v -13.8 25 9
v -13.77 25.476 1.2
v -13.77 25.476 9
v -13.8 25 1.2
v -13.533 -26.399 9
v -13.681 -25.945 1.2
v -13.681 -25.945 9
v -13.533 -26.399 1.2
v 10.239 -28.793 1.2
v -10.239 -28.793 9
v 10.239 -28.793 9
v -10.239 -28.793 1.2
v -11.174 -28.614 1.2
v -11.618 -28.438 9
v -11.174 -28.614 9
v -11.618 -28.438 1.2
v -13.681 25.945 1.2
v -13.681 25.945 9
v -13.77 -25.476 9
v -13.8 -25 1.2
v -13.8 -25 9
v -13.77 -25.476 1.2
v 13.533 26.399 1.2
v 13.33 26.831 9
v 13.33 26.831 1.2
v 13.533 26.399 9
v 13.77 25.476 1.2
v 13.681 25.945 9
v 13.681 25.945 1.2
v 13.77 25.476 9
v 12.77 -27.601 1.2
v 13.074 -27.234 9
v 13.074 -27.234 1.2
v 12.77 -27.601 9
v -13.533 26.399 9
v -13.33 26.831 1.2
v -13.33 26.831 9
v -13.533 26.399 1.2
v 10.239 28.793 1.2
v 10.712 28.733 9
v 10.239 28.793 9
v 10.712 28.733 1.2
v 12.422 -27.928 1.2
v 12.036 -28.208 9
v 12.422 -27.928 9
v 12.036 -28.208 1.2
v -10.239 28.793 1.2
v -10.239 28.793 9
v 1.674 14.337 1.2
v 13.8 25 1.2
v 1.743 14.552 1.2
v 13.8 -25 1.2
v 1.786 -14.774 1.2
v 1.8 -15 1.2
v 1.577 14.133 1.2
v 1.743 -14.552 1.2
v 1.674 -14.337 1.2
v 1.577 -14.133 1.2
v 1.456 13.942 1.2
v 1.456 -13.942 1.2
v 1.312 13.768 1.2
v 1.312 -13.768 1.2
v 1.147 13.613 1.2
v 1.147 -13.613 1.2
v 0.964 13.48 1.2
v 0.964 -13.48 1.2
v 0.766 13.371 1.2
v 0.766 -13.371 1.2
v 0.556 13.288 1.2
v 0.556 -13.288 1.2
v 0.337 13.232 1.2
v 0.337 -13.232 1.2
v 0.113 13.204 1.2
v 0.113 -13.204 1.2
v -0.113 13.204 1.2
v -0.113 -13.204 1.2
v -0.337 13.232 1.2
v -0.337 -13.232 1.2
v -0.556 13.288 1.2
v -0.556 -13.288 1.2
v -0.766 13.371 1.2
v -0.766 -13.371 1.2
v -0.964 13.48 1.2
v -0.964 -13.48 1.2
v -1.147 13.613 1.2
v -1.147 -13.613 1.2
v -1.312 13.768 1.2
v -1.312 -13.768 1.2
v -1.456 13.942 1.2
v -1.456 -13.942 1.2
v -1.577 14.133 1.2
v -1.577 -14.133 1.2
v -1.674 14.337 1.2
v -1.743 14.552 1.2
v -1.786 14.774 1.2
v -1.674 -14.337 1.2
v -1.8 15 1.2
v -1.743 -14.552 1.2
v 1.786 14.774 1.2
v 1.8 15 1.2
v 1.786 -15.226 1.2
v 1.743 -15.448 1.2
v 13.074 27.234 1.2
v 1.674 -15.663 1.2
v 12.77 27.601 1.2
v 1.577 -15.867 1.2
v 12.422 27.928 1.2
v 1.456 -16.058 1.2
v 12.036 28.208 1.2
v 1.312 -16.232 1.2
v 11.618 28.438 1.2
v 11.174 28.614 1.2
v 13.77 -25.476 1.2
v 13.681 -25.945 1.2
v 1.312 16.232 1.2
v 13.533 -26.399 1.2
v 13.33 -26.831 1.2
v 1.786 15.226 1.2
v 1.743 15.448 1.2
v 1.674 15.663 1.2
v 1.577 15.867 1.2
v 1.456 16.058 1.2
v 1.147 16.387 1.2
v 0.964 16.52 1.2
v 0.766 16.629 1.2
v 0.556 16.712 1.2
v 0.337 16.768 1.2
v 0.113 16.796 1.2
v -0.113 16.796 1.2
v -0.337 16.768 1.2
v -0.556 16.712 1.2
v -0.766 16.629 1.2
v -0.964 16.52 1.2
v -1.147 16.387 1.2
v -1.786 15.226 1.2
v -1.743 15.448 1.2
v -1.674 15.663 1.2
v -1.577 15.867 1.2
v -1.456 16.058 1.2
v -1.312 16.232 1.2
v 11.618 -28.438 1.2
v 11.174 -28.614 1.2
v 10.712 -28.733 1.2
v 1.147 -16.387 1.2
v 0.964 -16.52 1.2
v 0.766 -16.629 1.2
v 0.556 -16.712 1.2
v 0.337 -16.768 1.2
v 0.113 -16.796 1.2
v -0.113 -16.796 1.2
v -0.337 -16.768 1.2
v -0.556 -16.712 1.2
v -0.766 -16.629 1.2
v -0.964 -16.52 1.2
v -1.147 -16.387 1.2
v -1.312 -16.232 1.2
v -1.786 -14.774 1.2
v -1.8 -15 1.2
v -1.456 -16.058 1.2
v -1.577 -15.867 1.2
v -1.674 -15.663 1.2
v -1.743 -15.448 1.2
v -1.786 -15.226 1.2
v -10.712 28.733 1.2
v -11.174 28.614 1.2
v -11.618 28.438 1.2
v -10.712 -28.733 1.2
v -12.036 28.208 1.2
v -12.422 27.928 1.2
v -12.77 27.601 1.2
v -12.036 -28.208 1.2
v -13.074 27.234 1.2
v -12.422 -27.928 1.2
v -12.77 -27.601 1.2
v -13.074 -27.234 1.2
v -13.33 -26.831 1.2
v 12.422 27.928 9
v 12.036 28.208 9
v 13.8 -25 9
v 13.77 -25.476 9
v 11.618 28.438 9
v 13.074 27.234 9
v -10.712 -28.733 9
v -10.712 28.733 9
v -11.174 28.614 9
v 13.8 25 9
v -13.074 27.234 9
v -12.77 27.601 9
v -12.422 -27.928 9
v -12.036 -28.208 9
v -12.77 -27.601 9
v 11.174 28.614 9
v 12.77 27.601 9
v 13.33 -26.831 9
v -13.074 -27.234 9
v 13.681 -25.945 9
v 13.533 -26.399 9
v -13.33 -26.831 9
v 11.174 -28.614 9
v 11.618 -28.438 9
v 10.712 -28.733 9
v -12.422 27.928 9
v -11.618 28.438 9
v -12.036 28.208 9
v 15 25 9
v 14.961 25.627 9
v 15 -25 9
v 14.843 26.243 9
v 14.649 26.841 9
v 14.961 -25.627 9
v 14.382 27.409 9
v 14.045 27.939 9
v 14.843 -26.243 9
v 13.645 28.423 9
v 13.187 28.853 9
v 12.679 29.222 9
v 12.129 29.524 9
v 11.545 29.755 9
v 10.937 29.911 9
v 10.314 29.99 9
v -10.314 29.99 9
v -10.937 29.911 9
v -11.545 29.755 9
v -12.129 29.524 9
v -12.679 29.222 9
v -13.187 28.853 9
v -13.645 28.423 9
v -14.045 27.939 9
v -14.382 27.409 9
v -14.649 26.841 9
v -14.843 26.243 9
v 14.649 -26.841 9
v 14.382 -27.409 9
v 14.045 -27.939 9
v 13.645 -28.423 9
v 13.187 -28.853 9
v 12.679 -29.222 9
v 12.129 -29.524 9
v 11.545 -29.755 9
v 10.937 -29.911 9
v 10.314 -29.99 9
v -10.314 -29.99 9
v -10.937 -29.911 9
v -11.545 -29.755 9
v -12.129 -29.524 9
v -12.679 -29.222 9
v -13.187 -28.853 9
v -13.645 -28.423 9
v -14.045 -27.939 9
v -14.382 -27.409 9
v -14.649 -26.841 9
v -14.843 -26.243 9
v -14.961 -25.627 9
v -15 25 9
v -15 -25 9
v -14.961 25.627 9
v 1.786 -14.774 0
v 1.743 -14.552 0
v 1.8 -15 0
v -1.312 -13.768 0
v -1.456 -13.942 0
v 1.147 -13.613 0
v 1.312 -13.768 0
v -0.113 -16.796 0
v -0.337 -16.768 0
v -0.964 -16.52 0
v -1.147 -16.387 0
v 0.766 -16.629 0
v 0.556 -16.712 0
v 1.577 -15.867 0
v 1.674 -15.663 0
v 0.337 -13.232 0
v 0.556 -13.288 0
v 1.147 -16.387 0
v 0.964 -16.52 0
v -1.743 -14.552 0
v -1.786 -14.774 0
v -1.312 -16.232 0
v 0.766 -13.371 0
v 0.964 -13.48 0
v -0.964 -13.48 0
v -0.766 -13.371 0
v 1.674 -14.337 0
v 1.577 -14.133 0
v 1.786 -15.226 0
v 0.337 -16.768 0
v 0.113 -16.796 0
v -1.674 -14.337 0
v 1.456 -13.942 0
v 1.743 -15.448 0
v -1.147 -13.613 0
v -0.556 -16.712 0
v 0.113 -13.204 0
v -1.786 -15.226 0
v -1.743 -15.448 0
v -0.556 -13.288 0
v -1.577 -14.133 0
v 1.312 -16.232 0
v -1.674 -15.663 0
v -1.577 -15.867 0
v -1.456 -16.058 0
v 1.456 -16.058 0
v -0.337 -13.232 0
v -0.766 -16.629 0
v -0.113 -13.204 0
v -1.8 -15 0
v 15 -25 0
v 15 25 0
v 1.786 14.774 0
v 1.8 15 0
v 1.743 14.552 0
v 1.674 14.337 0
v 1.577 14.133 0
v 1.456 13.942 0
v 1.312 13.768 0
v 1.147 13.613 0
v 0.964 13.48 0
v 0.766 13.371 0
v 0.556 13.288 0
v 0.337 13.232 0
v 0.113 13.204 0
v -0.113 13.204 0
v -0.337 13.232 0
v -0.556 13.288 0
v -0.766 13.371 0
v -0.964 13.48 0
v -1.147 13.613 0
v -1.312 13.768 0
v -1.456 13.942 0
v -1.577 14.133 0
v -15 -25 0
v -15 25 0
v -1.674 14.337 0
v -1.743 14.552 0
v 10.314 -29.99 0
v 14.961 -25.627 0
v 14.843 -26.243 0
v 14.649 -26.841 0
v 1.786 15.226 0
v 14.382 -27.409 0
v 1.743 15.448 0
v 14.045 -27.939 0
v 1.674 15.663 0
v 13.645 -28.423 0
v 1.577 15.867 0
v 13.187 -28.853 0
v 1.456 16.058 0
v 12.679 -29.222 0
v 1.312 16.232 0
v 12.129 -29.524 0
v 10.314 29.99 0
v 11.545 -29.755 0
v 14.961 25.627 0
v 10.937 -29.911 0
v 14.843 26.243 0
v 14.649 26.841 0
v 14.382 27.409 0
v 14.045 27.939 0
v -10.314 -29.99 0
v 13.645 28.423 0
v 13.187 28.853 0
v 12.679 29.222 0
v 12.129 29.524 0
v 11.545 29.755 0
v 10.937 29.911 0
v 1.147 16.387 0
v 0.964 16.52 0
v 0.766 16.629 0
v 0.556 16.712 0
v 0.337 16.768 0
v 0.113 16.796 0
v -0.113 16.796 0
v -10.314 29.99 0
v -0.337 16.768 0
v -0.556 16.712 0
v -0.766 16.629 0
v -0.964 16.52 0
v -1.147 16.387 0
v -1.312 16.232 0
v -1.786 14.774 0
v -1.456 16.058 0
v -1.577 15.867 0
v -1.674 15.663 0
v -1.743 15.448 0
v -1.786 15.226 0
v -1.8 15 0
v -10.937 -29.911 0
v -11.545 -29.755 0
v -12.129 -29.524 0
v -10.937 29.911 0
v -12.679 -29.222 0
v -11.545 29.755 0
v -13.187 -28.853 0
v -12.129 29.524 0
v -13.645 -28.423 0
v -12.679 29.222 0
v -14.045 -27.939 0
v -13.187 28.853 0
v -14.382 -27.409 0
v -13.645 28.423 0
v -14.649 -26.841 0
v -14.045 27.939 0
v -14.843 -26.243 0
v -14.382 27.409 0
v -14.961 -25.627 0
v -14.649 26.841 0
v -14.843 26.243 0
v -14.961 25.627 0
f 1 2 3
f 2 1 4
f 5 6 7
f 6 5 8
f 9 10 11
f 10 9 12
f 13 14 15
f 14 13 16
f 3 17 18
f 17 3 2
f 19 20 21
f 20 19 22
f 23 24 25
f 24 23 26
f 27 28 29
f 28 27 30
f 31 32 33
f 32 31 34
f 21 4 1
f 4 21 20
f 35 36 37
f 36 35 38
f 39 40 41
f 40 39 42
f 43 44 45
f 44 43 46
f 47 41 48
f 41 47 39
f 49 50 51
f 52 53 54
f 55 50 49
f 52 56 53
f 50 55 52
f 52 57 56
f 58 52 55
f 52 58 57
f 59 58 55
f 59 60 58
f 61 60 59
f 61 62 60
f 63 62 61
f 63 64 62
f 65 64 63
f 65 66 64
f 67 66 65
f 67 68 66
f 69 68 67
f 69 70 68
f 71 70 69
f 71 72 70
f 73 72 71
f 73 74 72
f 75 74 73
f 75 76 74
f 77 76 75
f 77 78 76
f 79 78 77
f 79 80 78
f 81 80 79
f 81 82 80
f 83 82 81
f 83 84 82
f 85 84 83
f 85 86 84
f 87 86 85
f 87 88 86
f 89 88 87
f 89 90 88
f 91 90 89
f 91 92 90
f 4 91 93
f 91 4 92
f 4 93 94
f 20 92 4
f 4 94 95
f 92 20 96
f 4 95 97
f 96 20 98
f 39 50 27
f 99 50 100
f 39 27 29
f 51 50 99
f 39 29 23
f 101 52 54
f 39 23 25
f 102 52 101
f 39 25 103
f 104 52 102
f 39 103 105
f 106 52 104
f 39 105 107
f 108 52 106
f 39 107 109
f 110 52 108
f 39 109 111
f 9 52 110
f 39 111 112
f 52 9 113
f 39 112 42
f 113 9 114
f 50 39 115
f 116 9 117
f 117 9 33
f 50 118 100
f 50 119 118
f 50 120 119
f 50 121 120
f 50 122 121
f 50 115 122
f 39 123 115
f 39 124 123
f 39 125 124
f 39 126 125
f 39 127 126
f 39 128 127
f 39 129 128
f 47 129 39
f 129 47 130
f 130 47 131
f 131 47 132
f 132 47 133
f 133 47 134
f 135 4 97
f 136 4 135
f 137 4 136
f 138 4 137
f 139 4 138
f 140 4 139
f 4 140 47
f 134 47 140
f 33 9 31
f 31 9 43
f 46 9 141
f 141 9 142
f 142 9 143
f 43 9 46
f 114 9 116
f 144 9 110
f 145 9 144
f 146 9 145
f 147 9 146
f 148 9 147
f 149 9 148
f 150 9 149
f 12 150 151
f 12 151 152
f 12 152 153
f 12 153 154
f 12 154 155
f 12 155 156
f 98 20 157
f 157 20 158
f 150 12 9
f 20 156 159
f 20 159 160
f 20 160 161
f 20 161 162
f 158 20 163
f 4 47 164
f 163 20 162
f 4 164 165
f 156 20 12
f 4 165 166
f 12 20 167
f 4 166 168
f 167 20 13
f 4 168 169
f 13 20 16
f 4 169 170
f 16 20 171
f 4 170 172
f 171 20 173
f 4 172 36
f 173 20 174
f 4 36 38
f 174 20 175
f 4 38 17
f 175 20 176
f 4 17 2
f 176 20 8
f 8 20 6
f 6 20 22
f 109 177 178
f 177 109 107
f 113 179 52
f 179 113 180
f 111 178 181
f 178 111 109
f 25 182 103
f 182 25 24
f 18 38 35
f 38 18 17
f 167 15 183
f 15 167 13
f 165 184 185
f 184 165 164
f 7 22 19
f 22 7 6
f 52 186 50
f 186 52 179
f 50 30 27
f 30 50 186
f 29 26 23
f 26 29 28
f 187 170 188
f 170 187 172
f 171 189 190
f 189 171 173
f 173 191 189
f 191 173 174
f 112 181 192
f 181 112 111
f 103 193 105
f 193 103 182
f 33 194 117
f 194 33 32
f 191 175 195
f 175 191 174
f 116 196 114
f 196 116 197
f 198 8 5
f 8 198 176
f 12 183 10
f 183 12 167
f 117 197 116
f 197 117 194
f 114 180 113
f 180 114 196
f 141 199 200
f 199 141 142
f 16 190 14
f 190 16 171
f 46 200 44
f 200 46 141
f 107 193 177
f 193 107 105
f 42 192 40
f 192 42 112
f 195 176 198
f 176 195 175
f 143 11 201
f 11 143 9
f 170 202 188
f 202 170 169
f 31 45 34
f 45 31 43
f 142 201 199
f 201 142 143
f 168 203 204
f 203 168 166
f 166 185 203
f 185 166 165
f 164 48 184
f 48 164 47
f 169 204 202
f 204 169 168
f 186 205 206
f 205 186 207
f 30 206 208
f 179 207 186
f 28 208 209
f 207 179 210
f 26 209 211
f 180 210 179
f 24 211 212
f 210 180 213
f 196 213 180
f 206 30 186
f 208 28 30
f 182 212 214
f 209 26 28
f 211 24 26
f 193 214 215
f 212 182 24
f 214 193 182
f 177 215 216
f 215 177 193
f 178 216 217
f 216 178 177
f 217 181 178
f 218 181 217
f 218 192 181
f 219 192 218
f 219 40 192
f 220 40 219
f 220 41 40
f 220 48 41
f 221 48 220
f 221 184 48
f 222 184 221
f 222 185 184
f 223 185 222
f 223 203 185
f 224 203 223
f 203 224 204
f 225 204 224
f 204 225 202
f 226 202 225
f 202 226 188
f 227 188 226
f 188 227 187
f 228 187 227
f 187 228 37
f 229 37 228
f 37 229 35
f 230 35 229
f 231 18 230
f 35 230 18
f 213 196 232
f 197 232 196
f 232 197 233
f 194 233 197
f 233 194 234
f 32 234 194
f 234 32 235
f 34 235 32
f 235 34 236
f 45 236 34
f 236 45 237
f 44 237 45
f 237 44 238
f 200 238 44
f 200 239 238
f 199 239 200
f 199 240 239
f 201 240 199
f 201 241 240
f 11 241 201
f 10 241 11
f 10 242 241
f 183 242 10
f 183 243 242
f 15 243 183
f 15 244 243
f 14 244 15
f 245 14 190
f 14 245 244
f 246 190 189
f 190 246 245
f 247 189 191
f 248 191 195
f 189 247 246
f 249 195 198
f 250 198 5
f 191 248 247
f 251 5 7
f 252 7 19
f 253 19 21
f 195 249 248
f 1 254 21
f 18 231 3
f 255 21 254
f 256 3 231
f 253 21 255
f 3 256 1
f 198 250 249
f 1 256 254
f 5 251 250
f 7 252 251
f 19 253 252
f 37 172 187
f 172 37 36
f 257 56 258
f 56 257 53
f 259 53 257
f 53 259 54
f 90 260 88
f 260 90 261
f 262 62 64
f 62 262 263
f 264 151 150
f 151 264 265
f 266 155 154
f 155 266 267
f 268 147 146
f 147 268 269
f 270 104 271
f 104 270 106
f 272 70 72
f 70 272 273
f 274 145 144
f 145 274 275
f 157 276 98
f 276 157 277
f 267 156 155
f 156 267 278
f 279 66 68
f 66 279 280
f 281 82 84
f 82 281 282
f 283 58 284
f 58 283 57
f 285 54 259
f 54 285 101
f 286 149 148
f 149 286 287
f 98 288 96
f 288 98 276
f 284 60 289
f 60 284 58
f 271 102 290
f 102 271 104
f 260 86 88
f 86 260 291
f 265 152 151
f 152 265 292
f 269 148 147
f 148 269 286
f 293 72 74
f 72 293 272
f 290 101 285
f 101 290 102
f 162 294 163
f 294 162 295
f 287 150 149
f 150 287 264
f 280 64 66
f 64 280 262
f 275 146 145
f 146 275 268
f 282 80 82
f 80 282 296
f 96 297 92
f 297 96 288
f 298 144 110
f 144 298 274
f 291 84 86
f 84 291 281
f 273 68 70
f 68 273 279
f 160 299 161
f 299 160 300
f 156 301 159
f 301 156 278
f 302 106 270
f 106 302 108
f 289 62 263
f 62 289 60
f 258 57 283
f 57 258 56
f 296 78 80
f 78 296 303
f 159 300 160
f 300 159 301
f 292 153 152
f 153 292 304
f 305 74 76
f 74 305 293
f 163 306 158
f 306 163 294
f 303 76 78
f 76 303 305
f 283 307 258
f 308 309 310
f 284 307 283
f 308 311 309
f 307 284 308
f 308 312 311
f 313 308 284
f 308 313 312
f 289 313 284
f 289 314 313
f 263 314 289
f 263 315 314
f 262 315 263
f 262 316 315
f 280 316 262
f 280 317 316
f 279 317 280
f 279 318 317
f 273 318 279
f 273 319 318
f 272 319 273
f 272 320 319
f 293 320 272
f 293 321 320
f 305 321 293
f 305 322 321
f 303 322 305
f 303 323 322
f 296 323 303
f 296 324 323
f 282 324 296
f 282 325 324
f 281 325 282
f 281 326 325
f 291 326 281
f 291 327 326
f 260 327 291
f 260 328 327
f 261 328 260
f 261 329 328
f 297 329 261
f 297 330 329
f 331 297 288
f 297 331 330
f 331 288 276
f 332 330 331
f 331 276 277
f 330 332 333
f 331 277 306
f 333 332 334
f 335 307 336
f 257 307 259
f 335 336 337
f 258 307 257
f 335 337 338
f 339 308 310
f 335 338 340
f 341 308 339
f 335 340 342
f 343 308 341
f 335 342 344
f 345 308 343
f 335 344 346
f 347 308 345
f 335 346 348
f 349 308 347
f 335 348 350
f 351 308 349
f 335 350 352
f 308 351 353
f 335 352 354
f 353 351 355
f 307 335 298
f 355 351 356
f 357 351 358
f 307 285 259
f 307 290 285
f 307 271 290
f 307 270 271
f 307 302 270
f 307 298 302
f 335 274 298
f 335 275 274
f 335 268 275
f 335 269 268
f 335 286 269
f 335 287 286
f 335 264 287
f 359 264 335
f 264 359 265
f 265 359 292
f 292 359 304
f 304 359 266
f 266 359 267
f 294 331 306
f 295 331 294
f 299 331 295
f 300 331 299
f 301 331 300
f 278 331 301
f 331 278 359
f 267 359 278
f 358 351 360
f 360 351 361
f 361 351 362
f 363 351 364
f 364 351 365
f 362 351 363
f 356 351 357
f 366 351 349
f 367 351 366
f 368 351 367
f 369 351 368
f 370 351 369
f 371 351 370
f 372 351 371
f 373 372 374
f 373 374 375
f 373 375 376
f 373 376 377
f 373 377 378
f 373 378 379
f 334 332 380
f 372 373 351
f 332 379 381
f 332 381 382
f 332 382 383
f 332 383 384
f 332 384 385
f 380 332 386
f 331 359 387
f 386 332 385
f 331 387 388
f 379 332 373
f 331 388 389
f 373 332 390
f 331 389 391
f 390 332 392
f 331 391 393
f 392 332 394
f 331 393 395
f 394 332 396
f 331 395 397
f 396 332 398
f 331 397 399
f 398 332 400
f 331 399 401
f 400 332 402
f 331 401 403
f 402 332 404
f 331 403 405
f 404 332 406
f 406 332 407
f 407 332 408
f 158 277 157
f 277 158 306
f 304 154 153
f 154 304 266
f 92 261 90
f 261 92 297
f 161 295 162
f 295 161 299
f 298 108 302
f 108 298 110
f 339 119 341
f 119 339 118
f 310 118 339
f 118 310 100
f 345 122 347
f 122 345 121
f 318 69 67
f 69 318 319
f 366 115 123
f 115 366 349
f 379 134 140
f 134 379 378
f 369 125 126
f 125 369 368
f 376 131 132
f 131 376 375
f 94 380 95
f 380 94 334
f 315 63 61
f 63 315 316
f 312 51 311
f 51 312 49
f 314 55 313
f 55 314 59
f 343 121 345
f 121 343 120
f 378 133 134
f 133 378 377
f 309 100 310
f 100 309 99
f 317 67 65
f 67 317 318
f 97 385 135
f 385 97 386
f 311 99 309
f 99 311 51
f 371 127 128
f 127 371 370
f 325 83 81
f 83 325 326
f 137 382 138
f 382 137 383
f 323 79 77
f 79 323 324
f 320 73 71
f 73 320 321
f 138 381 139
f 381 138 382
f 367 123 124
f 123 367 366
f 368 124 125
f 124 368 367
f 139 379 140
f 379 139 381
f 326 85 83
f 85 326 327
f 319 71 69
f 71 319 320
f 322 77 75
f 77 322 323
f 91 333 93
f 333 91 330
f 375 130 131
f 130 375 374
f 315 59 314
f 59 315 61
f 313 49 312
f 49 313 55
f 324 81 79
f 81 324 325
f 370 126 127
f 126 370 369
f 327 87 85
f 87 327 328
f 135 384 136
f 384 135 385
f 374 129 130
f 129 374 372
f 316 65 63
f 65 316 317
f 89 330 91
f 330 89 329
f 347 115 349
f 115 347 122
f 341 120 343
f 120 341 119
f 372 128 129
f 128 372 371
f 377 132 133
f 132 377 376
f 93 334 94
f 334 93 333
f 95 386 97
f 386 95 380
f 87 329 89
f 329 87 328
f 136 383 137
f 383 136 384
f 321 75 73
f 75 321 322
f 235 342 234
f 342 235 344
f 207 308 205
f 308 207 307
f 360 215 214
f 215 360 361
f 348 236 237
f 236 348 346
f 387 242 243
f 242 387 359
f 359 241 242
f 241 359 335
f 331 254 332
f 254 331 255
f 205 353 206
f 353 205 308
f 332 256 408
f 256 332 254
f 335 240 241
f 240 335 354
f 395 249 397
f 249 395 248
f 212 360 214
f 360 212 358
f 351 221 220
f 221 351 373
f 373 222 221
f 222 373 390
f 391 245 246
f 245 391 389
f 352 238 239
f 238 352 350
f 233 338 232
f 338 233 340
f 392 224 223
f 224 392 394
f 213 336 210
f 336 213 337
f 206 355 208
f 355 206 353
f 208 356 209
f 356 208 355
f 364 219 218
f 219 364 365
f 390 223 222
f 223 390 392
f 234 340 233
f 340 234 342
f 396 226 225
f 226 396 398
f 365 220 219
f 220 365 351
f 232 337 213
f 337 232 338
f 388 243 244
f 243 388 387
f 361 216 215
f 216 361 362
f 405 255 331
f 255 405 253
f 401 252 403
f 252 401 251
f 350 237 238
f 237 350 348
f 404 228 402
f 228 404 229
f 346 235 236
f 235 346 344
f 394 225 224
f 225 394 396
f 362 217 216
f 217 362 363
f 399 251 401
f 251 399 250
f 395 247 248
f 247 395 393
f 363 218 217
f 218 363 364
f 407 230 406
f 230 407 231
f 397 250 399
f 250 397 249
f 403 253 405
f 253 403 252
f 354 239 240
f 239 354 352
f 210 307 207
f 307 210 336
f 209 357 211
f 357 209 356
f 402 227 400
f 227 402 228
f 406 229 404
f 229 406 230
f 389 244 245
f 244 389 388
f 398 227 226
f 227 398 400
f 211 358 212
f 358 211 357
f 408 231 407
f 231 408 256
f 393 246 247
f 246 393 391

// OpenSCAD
$fn = 50;


difference() {
	union() {
		hull() {
			translate(v = [-10.0000000000, 25.0000000000, 0]) {
				cylinder(h = 9, r = 5);
			}
			translate(v = [10.0000000000, 25.0000000000, 0]) {
				cylinder(h = 9, r = 5);
			}
			translate(v = [-10.0000000000, -25.0000000000, 0]) {
				cylinder(h = 9, r = 5);
			}
			translate(v = [10.0000000000, -25.0000000000, 0]) {
				cylinder(h = 9, r = 5);
			}
		}
	}
	union() {
		translate(v = [0, 0, 1.2000000000]) {
			hull() {
				translate(v = [-10.0000000000, 25.0000000000, 0]) {
					cylinder(h = 7.8000000000, r = 3.8000000000);
				}
				translate(v = [10.0000000000, 25.0000000000, 0]) {
					cylinder(h = 7.8000000000, r = 3.8000000000);
				}
				translate(v = [-10.0000000000, -25.0000000000, 0]) {
					cylinder(h = 7.8000000000, r = 3.8000000000);
				}
				translate(v = [10.0000000000, -25.0000000000, 0]) {
					cylinder(h = 7.8000000000, r = 3.8000000000);
				}
			}
		}
		#translate(v = [0.0000000000, -15.0000000000, 0]) {
			cylinder(h = 1.2000000000, r = 1.8000000000);
		}
		#translate(v = [0.0000000000, 15.0000000000, 0]) {
			cylinder(h = 1.2000000000, r = 1.8000000000);
		}
	}
}
